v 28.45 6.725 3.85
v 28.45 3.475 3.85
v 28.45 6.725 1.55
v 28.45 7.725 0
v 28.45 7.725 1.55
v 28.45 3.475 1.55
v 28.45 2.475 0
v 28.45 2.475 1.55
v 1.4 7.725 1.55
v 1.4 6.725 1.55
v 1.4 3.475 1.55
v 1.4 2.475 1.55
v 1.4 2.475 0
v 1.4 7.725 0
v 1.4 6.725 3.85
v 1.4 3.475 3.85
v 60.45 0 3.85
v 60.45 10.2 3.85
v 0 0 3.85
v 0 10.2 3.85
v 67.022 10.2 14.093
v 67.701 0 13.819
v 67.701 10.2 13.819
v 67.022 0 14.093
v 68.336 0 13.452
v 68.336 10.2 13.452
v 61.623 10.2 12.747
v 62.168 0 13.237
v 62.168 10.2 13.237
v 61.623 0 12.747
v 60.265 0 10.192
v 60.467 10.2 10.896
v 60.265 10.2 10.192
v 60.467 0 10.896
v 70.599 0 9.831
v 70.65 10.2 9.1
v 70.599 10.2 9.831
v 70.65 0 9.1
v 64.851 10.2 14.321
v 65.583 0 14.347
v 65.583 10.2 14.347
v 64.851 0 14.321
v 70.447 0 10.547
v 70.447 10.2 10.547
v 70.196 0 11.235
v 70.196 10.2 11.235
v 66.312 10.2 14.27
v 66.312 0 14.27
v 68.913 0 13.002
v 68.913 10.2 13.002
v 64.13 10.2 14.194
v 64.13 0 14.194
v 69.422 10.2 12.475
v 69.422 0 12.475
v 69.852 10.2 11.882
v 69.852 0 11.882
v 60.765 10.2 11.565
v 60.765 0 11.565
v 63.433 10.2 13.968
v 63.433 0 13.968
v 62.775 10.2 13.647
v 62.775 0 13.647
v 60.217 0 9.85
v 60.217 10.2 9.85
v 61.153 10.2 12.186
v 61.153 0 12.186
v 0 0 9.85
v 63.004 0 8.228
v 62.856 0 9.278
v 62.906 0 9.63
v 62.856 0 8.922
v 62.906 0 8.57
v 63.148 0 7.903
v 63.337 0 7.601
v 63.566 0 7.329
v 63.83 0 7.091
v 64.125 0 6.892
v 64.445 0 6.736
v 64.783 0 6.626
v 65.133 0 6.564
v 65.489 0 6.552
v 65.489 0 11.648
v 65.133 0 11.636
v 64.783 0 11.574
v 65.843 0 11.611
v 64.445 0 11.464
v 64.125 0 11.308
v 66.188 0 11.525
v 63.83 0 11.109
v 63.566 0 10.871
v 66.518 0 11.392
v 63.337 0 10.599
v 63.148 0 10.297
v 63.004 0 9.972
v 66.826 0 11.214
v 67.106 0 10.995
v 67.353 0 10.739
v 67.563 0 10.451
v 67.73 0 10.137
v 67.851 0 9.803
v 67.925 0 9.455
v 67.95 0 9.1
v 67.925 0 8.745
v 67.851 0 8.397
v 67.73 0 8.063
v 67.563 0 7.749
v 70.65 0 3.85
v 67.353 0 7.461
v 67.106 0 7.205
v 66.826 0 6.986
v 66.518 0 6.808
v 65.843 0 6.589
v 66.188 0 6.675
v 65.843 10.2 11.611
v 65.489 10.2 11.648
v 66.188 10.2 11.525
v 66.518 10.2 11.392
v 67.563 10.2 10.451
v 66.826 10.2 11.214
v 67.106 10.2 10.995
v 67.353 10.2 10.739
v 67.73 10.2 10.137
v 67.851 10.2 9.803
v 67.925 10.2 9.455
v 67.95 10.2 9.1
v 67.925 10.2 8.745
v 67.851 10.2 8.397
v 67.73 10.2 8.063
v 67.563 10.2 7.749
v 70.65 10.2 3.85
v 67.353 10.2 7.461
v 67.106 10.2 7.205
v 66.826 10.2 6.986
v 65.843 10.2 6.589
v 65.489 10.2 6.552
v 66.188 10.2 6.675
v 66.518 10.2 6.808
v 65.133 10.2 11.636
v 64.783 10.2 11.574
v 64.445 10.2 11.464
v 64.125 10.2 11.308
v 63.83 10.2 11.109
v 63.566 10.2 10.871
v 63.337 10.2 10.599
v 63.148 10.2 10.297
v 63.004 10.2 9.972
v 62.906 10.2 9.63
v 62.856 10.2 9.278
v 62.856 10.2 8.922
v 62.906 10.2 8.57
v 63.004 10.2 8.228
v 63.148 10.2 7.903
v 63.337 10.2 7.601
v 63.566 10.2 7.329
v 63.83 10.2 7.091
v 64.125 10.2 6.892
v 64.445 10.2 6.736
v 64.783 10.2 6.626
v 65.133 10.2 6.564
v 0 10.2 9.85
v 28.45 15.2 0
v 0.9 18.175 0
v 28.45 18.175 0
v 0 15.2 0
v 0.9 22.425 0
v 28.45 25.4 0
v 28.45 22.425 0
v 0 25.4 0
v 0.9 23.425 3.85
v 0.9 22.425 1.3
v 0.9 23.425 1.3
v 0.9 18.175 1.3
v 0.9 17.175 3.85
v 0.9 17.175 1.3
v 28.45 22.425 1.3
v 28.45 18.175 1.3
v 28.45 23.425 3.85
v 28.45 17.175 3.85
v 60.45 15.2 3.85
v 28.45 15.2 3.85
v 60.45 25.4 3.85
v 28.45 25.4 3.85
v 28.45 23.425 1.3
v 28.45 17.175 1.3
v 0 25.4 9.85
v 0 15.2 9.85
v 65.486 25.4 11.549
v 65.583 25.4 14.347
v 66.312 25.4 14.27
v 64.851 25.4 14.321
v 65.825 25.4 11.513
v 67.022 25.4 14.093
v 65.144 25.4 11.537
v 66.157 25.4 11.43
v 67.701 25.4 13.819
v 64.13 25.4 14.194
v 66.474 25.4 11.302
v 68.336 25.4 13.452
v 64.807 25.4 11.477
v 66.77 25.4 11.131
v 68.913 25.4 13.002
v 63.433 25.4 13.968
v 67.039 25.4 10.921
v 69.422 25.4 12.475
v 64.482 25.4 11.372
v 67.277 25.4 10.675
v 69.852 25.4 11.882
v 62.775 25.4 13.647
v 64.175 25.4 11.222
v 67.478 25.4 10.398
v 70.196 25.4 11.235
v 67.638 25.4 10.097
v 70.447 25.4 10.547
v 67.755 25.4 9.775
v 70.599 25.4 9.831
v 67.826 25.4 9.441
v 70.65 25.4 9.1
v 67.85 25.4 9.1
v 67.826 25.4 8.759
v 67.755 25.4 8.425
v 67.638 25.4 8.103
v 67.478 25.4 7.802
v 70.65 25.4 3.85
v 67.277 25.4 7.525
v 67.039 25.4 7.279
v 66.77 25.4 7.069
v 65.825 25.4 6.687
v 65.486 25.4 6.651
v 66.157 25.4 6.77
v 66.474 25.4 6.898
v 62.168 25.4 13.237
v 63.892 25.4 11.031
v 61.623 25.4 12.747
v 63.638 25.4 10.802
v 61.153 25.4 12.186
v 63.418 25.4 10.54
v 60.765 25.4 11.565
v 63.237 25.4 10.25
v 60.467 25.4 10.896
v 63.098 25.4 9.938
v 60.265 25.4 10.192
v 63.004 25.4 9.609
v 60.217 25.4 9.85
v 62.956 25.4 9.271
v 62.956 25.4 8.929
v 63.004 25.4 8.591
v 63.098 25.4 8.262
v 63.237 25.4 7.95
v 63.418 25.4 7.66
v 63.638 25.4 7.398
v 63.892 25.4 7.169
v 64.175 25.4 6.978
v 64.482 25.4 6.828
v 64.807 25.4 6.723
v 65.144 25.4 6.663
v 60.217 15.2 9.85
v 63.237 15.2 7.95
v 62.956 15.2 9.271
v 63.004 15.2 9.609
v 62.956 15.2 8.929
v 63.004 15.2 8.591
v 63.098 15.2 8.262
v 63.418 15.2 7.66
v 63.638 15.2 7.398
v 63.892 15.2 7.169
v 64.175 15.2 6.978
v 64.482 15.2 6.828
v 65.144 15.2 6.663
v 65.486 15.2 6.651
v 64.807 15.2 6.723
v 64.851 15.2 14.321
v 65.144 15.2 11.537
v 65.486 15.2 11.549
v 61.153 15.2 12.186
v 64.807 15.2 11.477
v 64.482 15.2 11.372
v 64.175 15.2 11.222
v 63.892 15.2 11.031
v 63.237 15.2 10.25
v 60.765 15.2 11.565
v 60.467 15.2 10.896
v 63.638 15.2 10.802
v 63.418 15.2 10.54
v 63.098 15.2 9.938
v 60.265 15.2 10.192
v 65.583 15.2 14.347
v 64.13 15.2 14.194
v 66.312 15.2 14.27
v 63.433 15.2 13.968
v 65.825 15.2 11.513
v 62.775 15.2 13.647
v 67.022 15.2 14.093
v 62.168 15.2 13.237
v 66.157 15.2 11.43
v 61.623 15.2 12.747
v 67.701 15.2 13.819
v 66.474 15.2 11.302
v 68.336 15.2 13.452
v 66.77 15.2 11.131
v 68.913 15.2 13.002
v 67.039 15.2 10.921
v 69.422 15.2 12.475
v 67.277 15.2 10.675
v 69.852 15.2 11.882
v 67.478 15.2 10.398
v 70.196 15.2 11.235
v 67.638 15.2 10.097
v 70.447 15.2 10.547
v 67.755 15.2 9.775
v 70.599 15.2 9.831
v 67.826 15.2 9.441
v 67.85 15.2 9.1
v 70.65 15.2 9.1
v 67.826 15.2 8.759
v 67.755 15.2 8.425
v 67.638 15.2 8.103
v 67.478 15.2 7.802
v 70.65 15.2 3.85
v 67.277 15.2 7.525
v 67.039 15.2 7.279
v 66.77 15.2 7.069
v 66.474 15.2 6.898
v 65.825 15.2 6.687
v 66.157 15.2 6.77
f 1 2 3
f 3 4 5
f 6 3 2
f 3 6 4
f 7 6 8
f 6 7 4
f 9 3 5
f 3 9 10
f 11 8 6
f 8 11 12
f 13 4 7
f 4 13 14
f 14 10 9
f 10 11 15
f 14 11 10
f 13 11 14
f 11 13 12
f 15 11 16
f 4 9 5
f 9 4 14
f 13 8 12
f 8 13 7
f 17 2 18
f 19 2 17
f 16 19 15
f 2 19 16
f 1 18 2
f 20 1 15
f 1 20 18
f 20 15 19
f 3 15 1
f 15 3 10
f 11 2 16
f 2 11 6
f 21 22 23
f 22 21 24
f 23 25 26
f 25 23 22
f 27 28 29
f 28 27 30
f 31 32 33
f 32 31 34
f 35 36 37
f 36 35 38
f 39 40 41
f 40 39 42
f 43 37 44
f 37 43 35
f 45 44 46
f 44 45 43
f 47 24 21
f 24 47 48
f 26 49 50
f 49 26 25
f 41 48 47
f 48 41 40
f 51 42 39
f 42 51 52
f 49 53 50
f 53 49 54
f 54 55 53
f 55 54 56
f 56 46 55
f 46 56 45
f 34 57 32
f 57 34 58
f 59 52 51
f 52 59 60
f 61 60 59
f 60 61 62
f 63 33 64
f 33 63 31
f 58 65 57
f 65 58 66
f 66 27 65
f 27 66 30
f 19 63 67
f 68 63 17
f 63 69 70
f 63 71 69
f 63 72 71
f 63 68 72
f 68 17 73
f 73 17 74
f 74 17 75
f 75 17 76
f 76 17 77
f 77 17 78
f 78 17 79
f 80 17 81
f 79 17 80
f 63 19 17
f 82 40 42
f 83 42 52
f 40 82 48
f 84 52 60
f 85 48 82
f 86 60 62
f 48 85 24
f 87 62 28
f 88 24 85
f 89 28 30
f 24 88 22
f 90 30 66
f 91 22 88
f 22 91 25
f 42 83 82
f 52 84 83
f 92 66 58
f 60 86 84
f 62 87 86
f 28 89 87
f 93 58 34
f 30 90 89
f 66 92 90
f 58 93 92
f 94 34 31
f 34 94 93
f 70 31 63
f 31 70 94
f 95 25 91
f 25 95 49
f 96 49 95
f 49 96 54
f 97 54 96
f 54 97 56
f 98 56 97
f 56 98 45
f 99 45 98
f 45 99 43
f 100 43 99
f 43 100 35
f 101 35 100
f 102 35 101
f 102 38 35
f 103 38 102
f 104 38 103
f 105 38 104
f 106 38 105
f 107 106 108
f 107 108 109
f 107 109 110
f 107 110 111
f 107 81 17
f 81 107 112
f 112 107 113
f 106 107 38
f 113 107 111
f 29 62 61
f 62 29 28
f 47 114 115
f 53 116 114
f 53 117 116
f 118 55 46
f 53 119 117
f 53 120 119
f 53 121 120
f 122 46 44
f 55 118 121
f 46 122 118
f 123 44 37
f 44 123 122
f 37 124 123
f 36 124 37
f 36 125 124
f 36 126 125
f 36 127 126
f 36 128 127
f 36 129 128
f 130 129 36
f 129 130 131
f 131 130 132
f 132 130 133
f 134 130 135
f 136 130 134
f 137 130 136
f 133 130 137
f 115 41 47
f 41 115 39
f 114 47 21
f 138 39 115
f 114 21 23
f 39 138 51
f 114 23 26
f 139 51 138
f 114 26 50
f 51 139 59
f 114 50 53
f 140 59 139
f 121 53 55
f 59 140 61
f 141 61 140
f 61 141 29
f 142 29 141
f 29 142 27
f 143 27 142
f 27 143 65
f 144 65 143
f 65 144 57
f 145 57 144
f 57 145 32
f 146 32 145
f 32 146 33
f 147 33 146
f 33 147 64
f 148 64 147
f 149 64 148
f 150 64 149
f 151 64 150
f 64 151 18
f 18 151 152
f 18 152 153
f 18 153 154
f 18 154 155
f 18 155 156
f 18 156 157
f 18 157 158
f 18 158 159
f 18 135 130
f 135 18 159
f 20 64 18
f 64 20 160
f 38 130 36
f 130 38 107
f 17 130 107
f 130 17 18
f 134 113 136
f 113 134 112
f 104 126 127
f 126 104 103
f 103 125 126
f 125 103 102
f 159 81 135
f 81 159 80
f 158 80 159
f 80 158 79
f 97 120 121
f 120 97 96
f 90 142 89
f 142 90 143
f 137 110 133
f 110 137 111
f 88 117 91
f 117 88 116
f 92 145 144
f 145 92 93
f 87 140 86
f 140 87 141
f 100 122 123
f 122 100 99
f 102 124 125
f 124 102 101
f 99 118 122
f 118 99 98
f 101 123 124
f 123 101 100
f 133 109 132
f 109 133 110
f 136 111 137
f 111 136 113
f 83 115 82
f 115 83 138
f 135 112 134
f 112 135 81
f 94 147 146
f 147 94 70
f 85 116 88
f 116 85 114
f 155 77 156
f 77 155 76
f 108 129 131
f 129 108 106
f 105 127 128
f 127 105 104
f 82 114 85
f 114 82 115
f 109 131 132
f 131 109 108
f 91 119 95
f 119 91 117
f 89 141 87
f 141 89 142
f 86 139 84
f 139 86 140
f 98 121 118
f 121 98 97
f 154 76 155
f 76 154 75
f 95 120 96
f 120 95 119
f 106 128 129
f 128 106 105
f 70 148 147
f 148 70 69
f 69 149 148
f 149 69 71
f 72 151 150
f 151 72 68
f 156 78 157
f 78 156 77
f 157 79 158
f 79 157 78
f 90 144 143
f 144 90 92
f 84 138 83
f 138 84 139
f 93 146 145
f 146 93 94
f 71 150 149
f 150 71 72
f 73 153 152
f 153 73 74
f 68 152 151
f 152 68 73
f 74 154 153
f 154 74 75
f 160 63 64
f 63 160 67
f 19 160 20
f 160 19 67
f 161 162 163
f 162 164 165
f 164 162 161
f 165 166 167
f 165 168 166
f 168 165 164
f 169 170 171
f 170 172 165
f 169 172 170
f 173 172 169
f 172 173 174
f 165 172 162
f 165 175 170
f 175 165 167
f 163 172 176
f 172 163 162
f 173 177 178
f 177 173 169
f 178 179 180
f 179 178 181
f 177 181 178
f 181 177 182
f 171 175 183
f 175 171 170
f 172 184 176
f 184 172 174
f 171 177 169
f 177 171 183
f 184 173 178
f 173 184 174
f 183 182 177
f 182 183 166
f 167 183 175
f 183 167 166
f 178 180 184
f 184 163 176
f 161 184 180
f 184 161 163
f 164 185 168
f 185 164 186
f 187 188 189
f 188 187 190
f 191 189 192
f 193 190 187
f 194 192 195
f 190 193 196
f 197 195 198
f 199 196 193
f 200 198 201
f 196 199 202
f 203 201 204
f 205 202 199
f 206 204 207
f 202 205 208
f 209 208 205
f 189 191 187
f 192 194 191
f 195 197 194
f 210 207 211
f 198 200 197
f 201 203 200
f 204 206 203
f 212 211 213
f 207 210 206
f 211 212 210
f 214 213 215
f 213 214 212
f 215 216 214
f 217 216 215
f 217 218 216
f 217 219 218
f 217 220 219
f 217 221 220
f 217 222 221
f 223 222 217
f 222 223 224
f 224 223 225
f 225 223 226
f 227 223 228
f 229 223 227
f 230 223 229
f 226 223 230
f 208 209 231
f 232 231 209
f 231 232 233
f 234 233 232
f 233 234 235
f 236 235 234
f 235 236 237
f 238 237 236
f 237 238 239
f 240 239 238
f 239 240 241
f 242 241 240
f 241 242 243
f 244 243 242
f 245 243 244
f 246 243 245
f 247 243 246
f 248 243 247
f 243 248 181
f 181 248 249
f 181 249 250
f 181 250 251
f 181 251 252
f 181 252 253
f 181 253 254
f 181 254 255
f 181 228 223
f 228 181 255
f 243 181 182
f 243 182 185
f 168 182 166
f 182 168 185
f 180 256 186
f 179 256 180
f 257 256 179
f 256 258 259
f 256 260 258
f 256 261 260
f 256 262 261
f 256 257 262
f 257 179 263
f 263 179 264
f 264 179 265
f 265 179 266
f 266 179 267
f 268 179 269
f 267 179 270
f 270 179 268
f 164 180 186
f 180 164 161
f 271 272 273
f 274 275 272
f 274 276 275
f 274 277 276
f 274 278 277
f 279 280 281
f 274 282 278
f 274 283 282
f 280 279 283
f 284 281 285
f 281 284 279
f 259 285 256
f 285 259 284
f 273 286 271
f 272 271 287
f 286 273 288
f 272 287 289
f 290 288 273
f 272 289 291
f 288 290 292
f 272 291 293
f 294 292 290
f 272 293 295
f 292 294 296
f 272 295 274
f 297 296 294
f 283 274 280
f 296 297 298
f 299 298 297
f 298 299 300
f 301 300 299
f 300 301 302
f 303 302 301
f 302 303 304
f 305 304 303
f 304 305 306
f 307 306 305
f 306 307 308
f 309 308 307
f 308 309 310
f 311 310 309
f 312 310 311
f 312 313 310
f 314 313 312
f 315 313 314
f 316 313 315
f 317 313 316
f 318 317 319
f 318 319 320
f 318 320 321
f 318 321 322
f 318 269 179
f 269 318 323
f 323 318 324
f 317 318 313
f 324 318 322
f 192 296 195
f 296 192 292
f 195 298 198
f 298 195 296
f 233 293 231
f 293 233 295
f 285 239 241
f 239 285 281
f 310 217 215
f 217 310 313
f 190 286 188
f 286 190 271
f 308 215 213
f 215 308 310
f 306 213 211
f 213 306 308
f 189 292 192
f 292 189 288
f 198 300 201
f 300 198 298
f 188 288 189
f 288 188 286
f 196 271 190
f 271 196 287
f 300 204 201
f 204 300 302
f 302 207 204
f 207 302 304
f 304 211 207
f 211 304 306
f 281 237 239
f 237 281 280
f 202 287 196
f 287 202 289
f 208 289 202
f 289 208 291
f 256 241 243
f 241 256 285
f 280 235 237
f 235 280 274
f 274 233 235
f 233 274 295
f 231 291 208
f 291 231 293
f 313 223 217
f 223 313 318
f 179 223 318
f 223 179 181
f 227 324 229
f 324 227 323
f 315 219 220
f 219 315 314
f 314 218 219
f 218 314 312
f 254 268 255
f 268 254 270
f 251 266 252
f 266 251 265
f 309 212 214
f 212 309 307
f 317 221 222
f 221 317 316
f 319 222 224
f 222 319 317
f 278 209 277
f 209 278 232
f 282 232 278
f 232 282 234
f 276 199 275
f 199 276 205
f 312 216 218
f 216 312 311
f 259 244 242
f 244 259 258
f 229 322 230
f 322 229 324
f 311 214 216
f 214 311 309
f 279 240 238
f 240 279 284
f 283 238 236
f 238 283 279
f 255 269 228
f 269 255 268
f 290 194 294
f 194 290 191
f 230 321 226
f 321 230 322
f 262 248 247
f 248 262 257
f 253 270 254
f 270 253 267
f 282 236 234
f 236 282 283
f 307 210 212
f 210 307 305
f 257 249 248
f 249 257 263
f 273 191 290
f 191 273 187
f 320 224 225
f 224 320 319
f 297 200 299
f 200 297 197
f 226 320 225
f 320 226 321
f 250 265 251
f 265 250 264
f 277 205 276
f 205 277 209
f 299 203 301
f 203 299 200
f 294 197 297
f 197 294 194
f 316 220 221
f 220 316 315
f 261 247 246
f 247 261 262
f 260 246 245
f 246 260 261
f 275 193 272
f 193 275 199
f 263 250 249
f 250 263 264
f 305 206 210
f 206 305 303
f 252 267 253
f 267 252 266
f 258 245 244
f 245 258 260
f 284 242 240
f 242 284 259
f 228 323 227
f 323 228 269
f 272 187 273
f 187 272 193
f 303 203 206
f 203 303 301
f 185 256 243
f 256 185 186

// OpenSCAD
// Number of circle elements
fn = 45;
// Tolerance to ensure difference() leaves no 2d plane
dt = 0.1;
// Tolerance of the first part
t = 0.3;
// Tolerance of the second part
t2 = 0.2;

// Length of the tab
x1 = 27.35;
// Length of the bottom of the receiver
x3 = 1.1;
// Length of the plate
x2 = x1 + x3 + 32;
// Width of the tab
y1 = 5.85;
// Width of the tab to plate connector
y2 = 3.85;
// Width of the plate
y3 = 10.2;
// Distance between parts
y4 = 5;
// Height of the tab
z1 = 2.15;
// Height of the tab to plate connector
z2 = 3.85 - z1;
// Height of the plate
z3 = 6;
// Diameter of the hole, 4.5 allows for an M4 bolt
o = 4.5;
x4 = x2 - t; // Position of the hole

union() {
	// Add tolerances
	x1t = x1 - t;
	x3t = x3 + t;
	y1t = y1 - 2 * t;
	y2t = y2 - 2 * t;
	z1t = z1 - 2 * t;
	z2t = z2 + 2 * t;
	z5 = z1t + z2t;
	
	translate([x3t, (y3 - y1t) / 2, 0]) {
		cube([x1t, y1t, z1t]);
		translate([0, (y1t - y2t) / 2, z1t]) {
			cube([x1t, y2t, z2t]);
		}
	}
	translate([0, 0, z5]) {
		cube([x2, y3, z3]);
	}
	translate([x4, 0, z5]) {
		eye(o, z3 / 2, y3, tolerance = t, fn = fn);
	}
}

translate([0, y3 + y4, 0]) union() {
	// Add tolerances
	x1t = x1 + t2;
	x3t = x3 - t2;
	y1t = y1 + 2 * t2;
	y2t = y2 + 2 * t2;
	z1t = z1 + 2 * t2;
	z2t = z2 - 2 * t2;
	z5 = z1t + z2t;
	
	difference() {
		cube([x1 + x3, y3, z5]);
		translate([x3t, (y3 - y1t) / 2, 0]) {
			translate([0, (y1t - y2t) / 2, 0]) cube([x1t + dt, y2t, z2t + dt]);
			translate([0, 0, z2t]) cube([x1t + dt, y1t, z1t]);
		}
	}
	translate([0, 0, z5]) {
		cube([x2, y3, z3]);
	}
	translate([x4, 0, z5]) {
		eye(o, z3 / 2, y3, tolerance = t2, fn = fn);
	}
}

module eye(holeDiameter, edgeThickness, height, tolerance = 0, fn = 20) {
	outerD = 2 * edgeThickness + holeDiameter;
	outerR = outerD / 2;
	
	translate([outerR, 0, outerR]) {
		rotate([270, 0, 0]) difference() {
			union() {
				cylinder(h = height, d = outerD, $fn = fn);
				translate([-outerR, 0, 0]) cube([outerD, outerR, height]);
			}
			cylinder(h = height, d = holeDiameter + 2 * tolerance, $fn = fn);
		}
	}
}
